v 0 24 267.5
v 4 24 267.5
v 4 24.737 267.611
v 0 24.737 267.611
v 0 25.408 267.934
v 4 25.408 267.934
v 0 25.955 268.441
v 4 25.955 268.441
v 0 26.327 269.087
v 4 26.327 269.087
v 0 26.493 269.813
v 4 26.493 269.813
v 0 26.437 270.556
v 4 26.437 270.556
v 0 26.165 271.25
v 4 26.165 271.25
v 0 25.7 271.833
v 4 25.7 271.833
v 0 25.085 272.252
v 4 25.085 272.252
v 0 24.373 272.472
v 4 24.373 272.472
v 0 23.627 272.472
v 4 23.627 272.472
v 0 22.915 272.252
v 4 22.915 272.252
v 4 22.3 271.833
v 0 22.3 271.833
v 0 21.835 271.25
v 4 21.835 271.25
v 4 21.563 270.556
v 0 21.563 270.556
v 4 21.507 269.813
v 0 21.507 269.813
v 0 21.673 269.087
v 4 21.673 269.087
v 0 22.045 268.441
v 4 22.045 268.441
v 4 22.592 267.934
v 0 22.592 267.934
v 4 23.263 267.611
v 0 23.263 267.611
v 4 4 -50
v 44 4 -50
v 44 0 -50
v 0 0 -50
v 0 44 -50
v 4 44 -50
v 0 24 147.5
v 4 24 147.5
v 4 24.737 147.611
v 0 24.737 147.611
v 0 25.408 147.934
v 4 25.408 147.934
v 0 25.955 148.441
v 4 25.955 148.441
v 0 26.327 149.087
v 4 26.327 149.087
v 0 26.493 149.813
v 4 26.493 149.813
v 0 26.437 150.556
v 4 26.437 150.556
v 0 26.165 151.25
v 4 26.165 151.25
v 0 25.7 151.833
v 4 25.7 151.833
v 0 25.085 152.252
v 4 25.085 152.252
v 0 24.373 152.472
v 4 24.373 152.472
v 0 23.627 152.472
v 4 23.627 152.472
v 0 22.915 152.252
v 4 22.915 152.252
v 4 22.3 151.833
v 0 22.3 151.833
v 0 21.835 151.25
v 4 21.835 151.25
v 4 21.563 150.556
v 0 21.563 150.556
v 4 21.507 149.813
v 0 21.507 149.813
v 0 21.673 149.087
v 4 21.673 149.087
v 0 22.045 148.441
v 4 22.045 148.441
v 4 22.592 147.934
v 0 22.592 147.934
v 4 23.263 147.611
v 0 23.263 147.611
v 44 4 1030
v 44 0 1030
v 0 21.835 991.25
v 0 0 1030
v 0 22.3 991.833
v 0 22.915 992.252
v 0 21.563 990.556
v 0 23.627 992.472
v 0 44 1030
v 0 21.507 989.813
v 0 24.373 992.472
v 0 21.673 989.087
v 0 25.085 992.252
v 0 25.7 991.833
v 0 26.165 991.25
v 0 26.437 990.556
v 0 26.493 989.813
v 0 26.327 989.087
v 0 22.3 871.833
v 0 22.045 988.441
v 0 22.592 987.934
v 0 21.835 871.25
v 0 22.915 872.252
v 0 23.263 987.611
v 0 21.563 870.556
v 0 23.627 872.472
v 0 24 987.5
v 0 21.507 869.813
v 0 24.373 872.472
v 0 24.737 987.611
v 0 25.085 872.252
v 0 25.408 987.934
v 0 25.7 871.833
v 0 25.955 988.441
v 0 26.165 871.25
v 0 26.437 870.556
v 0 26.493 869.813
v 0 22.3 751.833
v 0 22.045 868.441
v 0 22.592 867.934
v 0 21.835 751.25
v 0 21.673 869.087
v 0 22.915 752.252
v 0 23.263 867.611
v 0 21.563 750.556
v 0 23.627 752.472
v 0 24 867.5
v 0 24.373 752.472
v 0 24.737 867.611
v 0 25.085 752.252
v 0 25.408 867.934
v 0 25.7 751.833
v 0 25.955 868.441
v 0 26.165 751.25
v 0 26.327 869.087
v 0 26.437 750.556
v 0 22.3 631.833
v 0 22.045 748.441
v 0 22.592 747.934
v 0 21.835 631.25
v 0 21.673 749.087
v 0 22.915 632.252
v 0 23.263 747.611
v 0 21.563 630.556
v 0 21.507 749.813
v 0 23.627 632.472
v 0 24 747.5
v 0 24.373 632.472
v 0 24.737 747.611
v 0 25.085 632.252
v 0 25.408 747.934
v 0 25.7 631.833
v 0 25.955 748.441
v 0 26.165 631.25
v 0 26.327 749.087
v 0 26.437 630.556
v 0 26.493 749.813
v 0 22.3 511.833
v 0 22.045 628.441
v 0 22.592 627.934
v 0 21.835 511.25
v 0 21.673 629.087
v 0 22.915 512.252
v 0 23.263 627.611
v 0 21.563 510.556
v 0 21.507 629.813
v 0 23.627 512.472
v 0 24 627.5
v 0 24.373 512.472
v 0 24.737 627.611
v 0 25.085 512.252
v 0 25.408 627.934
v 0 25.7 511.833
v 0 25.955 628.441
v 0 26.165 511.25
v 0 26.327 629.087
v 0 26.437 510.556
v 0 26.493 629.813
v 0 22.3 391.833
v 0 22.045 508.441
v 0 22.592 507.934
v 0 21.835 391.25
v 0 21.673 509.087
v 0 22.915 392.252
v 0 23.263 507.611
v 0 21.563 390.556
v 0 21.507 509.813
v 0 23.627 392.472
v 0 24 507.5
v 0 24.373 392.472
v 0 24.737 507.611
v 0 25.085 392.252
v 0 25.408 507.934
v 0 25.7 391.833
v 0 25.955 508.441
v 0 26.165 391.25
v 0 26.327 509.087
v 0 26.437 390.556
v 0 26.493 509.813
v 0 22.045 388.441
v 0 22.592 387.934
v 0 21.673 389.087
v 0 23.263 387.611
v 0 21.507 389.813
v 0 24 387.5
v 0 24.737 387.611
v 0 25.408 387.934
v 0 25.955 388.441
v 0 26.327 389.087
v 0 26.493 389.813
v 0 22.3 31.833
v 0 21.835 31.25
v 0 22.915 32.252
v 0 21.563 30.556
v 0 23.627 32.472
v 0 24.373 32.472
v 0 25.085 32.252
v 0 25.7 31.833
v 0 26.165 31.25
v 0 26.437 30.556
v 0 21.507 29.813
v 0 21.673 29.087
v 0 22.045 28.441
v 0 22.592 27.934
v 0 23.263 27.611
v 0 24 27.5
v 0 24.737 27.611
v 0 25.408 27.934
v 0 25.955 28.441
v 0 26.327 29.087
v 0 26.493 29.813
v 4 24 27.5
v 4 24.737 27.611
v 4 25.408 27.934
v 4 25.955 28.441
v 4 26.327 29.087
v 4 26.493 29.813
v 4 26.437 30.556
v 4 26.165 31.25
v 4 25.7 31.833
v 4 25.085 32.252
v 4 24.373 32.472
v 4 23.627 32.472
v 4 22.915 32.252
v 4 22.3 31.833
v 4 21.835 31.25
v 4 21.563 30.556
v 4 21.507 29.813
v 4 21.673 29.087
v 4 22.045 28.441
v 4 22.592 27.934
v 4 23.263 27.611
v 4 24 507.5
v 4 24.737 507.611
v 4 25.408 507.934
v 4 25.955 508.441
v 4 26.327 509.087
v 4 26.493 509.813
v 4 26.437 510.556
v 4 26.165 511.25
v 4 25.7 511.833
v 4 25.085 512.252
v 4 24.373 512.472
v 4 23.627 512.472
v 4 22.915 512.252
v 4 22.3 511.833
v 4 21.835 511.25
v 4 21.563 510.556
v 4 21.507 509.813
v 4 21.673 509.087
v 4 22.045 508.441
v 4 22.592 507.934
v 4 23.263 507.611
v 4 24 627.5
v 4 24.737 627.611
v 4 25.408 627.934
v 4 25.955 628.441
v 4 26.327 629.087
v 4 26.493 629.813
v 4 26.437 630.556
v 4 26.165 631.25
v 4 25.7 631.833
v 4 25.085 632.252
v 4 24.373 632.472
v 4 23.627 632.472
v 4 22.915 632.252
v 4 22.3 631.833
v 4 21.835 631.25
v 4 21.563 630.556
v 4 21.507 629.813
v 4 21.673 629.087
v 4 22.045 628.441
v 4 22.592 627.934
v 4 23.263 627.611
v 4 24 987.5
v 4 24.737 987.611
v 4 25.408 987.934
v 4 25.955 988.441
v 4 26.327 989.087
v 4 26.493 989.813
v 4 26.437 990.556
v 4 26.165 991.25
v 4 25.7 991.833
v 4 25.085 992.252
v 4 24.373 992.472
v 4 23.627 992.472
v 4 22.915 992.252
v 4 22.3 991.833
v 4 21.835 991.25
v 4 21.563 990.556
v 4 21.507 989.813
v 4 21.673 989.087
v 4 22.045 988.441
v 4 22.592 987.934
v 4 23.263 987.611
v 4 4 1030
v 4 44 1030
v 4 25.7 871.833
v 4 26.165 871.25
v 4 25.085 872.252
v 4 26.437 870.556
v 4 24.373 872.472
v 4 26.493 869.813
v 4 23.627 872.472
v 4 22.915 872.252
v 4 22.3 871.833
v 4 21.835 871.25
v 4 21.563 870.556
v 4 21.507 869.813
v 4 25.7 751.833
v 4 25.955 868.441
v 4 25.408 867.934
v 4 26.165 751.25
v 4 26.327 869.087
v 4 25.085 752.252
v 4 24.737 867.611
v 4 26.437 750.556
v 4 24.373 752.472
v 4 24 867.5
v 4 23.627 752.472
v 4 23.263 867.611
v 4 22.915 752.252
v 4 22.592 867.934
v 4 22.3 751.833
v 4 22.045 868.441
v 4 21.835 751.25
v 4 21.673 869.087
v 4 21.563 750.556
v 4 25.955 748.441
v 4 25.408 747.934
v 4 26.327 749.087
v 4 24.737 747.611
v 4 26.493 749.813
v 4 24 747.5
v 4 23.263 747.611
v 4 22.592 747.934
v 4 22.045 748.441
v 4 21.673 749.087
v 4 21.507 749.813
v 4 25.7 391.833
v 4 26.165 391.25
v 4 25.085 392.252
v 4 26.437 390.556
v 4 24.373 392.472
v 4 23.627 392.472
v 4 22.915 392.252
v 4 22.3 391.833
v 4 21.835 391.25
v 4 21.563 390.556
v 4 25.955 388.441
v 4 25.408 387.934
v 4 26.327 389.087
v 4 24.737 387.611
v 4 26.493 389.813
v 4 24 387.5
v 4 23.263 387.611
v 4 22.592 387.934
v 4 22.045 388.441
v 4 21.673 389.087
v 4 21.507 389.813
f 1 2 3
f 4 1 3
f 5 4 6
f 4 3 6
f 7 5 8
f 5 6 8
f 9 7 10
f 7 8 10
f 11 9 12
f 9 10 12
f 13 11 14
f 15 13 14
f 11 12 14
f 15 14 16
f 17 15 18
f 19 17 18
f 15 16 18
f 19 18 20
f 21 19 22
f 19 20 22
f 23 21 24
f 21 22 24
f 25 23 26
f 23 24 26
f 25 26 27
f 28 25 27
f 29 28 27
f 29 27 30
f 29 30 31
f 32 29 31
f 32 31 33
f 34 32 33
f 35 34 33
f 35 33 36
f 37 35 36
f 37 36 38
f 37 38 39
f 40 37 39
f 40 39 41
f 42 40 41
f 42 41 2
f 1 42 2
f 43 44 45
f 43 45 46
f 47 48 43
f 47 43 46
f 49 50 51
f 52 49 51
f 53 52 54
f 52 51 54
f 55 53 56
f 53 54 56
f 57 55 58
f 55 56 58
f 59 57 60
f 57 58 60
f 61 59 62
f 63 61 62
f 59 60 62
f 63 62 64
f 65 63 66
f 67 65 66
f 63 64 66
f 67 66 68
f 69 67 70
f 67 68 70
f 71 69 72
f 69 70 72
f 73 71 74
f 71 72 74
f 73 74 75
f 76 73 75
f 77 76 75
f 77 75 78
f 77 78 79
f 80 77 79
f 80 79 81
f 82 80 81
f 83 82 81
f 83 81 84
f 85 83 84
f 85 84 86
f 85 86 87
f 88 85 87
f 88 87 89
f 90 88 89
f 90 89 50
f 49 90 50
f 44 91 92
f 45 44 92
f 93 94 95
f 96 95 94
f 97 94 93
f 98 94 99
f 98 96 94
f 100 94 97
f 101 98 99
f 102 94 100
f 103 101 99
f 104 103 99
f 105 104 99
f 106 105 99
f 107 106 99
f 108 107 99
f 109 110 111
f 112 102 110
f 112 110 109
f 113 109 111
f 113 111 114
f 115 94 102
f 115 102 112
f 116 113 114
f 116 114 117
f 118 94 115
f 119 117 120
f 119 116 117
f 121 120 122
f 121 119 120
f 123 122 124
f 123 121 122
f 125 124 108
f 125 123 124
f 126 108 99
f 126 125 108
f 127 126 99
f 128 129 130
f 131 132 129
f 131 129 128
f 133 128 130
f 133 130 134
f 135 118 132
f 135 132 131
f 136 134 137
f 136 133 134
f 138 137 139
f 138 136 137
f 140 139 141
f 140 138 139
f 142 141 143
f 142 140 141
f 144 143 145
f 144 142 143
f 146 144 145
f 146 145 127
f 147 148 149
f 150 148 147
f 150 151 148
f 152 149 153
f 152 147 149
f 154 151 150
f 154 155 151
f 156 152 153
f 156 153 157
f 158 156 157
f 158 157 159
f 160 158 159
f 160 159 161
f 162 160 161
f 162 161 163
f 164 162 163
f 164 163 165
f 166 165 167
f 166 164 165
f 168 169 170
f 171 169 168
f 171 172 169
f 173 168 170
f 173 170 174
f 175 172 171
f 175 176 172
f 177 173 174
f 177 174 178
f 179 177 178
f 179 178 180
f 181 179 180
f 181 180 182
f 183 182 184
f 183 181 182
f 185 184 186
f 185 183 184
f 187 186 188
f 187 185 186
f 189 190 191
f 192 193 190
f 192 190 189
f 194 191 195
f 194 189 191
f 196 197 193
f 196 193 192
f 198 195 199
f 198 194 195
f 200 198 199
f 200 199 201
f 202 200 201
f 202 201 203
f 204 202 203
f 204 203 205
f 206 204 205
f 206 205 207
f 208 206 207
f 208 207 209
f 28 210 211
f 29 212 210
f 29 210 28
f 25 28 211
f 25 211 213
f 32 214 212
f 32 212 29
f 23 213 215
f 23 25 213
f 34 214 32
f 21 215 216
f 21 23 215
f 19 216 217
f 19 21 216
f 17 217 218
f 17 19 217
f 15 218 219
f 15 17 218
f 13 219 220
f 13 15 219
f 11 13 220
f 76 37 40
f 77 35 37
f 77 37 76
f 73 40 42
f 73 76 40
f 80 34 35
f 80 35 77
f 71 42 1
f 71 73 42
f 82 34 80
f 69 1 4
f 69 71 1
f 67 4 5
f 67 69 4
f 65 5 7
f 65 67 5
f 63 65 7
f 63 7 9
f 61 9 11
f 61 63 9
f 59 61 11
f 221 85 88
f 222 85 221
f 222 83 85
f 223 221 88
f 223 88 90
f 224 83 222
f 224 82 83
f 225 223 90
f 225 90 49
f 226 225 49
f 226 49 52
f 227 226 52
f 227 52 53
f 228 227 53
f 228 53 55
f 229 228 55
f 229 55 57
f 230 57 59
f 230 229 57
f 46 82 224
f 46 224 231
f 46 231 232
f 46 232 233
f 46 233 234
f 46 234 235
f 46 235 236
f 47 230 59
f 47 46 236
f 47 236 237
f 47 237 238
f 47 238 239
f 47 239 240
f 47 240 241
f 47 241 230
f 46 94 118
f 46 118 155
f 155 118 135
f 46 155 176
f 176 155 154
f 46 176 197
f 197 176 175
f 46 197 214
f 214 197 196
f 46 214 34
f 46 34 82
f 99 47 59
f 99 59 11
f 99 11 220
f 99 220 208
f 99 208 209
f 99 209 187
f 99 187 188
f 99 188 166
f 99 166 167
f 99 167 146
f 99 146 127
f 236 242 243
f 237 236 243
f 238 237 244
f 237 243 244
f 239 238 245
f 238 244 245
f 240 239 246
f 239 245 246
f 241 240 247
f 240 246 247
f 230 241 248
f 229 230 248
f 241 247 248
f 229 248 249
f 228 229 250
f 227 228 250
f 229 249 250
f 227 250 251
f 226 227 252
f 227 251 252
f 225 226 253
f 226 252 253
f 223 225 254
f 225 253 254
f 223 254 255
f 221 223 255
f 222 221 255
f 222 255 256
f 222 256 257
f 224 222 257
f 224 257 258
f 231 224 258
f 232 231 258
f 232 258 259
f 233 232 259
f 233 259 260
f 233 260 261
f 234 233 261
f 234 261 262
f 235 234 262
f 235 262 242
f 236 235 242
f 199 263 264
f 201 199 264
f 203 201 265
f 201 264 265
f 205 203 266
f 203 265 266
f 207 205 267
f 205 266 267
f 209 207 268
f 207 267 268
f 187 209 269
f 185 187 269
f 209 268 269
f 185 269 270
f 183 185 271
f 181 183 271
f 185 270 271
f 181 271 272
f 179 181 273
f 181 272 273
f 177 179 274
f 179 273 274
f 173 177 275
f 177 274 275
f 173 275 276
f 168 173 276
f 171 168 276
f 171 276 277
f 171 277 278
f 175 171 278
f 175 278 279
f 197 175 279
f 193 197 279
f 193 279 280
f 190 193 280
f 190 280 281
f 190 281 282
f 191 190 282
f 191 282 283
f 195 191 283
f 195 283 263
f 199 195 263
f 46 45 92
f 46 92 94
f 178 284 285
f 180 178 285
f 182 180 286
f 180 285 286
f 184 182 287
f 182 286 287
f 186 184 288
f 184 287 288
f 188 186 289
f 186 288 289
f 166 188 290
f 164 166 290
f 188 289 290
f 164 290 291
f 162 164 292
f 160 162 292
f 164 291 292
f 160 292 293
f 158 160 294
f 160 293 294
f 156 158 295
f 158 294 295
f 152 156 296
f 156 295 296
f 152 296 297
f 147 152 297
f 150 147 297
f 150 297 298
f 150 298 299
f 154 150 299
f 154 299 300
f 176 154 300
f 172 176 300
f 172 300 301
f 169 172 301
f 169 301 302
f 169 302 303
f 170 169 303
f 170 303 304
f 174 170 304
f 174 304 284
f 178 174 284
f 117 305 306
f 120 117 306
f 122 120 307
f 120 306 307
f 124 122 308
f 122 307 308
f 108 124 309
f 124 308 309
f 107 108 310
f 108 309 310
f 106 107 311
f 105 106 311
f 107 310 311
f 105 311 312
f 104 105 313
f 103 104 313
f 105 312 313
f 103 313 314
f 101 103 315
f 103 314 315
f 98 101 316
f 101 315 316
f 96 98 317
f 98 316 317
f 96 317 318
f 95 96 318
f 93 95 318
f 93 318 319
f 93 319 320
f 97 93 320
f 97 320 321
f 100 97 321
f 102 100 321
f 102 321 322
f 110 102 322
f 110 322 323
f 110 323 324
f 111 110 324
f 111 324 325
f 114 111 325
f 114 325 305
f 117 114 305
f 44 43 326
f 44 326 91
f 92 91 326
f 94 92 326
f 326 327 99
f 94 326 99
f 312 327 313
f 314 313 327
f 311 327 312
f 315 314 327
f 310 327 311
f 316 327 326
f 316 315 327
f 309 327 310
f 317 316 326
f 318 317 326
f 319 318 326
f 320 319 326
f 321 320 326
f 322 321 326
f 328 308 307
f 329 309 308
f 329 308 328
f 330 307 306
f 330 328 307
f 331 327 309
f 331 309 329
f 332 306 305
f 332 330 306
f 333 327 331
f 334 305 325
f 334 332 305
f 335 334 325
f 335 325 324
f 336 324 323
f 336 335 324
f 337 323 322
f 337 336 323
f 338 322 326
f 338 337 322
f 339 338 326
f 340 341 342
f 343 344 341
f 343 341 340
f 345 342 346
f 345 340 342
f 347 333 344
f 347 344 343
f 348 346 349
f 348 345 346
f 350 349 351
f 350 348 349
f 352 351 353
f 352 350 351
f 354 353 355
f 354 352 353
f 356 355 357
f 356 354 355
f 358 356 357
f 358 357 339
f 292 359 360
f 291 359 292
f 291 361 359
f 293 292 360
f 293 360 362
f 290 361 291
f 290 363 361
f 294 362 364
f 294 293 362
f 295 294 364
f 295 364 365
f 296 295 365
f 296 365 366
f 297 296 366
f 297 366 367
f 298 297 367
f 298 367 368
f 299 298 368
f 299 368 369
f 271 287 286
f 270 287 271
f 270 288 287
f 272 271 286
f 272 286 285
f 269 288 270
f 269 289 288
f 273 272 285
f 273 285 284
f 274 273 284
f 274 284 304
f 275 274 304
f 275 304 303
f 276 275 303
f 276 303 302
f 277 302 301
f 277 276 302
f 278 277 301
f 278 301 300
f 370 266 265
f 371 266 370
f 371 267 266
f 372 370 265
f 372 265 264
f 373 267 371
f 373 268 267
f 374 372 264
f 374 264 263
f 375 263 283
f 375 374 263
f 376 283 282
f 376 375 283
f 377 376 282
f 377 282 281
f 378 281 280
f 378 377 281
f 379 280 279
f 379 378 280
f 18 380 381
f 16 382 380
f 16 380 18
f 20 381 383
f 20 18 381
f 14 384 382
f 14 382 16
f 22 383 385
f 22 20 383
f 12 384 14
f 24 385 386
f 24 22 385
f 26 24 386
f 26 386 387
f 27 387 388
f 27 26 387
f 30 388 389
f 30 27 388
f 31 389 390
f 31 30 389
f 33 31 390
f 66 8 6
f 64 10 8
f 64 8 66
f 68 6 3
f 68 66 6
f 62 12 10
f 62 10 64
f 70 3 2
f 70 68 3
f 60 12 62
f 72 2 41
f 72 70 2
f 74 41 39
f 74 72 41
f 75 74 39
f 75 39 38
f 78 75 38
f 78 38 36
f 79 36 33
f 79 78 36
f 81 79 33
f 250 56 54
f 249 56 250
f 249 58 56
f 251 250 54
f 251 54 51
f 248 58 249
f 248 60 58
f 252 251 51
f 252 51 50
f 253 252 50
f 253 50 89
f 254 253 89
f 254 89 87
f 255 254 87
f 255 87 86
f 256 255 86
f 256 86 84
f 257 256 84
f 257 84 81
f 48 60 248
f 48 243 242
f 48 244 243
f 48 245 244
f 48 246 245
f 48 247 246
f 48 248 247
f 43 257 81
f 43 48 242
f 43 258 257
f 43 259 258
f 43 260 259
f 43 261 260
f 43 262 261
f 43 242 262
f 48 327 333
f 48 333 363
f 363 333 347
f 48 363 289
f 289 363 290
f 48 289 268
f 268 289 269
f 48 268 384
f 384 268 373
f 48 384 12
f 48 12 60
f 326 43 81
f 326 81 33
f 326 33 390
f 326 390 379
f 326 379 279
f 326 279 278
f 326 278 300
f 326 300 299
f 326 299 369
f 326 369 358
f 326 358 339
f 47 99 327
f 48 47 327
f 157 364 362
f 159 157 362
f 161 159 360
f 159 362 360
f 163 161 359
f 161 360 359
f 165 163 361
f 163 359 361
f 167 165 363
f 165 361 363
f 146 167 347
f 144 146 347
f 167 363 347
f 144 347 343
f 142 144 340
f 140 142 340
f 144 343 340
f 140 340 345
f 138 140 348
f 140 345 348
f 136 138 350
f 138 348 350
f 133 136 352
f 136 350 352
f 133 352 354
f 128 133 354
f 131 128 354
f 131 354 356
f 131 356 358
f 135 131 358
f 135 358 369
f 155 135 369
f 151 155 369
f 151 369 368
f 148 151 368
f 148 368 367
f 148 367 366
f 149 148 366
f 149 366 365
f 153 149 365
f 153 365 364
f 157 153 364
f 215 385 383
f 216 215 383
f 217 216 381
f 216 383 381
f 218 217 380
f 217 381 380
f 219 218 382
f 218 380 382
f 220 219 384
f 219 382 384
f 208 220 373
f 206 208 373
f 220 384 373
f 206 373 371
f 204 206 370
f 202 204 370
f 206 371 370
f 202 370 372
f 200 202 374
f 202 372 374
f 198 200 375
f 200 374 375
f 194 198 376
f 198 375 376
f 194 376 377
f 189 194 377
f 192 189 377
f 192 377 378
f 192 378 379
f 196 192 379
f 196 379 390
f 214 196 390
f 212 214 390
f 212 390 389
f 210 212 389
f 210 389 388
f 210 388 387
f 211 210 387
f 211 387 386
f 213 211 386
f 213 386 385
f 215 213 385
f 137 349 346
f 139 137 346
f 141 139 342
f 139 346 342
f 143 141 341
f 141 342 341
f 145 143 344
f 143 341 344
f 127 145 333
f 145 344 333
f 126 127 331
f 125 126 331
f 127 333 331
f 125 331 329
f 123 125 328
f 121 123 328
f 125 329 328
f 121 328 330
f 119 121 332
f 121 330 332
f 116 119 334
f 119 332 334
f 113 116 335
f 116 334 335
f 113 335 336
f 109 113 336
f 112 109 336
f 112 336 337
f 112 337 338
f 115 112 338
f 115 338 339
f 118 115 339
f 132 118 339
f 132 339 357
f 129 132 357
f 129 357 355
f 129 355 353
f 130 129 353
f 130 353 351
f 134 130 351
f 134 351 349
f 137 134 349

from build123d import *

# Parameters (mm, degrees)
BOSS_EXTRUDE1_DEPTH = 1080
SKETCH2_R           = 2.5
CUT_EXTRUDE1_DEPTH  = 1032.715076947


with BuildPart() as part:
    # Sketch1 → Boss-Extrude1 (new body)
    with BuildSketch(Plane(origin=(0, 0, -50), x_dir=(-1, 0, 0), z_dir=(0, 0, -1))):
        Polygon((0, 44), (-4, 44), (-4, 4), (-44, 4), (-44, 0), (0, 0), align=None)
    extrude(amount=-BOSS_EXTRUDE1_DEPTH)

    # Sketch2 → Cut-Extrude1 (cut, through all)
    with BuildSketch(Plane(origin=(4, 0, 0), x_dir=(0, 0, -1), z_dir=(1, 0, 0))):
        with Locations((-990, 24)):
            Circle(SKETCH2_R)
        with Locations((-870, 24)):
            Circle(SKETCH2_R)
        with Locations((-750, 24)):
            Circle(SKETCH2_R)
        with Locations((-630, 24)):
            Circle(SKETCH2_R)
        with Locations((-510, 24)):
            Circle(SKETCH2_R)
        with Locations((-390, 24)):
            Circle(SKETCH2_R)
        with Locations((-270, 24)):
            Circle(SKETCH2_R)
        with Locations((-150, 24)):
            Circle(SKETCH2_R)
        with Locations((-30, 24)):
            Circle(SKETCH2_R)
    extrude(amount=-CUT_EXTRUDE1_DEPTH, mode=Mode.SUBTRACT)


solid = part.part
